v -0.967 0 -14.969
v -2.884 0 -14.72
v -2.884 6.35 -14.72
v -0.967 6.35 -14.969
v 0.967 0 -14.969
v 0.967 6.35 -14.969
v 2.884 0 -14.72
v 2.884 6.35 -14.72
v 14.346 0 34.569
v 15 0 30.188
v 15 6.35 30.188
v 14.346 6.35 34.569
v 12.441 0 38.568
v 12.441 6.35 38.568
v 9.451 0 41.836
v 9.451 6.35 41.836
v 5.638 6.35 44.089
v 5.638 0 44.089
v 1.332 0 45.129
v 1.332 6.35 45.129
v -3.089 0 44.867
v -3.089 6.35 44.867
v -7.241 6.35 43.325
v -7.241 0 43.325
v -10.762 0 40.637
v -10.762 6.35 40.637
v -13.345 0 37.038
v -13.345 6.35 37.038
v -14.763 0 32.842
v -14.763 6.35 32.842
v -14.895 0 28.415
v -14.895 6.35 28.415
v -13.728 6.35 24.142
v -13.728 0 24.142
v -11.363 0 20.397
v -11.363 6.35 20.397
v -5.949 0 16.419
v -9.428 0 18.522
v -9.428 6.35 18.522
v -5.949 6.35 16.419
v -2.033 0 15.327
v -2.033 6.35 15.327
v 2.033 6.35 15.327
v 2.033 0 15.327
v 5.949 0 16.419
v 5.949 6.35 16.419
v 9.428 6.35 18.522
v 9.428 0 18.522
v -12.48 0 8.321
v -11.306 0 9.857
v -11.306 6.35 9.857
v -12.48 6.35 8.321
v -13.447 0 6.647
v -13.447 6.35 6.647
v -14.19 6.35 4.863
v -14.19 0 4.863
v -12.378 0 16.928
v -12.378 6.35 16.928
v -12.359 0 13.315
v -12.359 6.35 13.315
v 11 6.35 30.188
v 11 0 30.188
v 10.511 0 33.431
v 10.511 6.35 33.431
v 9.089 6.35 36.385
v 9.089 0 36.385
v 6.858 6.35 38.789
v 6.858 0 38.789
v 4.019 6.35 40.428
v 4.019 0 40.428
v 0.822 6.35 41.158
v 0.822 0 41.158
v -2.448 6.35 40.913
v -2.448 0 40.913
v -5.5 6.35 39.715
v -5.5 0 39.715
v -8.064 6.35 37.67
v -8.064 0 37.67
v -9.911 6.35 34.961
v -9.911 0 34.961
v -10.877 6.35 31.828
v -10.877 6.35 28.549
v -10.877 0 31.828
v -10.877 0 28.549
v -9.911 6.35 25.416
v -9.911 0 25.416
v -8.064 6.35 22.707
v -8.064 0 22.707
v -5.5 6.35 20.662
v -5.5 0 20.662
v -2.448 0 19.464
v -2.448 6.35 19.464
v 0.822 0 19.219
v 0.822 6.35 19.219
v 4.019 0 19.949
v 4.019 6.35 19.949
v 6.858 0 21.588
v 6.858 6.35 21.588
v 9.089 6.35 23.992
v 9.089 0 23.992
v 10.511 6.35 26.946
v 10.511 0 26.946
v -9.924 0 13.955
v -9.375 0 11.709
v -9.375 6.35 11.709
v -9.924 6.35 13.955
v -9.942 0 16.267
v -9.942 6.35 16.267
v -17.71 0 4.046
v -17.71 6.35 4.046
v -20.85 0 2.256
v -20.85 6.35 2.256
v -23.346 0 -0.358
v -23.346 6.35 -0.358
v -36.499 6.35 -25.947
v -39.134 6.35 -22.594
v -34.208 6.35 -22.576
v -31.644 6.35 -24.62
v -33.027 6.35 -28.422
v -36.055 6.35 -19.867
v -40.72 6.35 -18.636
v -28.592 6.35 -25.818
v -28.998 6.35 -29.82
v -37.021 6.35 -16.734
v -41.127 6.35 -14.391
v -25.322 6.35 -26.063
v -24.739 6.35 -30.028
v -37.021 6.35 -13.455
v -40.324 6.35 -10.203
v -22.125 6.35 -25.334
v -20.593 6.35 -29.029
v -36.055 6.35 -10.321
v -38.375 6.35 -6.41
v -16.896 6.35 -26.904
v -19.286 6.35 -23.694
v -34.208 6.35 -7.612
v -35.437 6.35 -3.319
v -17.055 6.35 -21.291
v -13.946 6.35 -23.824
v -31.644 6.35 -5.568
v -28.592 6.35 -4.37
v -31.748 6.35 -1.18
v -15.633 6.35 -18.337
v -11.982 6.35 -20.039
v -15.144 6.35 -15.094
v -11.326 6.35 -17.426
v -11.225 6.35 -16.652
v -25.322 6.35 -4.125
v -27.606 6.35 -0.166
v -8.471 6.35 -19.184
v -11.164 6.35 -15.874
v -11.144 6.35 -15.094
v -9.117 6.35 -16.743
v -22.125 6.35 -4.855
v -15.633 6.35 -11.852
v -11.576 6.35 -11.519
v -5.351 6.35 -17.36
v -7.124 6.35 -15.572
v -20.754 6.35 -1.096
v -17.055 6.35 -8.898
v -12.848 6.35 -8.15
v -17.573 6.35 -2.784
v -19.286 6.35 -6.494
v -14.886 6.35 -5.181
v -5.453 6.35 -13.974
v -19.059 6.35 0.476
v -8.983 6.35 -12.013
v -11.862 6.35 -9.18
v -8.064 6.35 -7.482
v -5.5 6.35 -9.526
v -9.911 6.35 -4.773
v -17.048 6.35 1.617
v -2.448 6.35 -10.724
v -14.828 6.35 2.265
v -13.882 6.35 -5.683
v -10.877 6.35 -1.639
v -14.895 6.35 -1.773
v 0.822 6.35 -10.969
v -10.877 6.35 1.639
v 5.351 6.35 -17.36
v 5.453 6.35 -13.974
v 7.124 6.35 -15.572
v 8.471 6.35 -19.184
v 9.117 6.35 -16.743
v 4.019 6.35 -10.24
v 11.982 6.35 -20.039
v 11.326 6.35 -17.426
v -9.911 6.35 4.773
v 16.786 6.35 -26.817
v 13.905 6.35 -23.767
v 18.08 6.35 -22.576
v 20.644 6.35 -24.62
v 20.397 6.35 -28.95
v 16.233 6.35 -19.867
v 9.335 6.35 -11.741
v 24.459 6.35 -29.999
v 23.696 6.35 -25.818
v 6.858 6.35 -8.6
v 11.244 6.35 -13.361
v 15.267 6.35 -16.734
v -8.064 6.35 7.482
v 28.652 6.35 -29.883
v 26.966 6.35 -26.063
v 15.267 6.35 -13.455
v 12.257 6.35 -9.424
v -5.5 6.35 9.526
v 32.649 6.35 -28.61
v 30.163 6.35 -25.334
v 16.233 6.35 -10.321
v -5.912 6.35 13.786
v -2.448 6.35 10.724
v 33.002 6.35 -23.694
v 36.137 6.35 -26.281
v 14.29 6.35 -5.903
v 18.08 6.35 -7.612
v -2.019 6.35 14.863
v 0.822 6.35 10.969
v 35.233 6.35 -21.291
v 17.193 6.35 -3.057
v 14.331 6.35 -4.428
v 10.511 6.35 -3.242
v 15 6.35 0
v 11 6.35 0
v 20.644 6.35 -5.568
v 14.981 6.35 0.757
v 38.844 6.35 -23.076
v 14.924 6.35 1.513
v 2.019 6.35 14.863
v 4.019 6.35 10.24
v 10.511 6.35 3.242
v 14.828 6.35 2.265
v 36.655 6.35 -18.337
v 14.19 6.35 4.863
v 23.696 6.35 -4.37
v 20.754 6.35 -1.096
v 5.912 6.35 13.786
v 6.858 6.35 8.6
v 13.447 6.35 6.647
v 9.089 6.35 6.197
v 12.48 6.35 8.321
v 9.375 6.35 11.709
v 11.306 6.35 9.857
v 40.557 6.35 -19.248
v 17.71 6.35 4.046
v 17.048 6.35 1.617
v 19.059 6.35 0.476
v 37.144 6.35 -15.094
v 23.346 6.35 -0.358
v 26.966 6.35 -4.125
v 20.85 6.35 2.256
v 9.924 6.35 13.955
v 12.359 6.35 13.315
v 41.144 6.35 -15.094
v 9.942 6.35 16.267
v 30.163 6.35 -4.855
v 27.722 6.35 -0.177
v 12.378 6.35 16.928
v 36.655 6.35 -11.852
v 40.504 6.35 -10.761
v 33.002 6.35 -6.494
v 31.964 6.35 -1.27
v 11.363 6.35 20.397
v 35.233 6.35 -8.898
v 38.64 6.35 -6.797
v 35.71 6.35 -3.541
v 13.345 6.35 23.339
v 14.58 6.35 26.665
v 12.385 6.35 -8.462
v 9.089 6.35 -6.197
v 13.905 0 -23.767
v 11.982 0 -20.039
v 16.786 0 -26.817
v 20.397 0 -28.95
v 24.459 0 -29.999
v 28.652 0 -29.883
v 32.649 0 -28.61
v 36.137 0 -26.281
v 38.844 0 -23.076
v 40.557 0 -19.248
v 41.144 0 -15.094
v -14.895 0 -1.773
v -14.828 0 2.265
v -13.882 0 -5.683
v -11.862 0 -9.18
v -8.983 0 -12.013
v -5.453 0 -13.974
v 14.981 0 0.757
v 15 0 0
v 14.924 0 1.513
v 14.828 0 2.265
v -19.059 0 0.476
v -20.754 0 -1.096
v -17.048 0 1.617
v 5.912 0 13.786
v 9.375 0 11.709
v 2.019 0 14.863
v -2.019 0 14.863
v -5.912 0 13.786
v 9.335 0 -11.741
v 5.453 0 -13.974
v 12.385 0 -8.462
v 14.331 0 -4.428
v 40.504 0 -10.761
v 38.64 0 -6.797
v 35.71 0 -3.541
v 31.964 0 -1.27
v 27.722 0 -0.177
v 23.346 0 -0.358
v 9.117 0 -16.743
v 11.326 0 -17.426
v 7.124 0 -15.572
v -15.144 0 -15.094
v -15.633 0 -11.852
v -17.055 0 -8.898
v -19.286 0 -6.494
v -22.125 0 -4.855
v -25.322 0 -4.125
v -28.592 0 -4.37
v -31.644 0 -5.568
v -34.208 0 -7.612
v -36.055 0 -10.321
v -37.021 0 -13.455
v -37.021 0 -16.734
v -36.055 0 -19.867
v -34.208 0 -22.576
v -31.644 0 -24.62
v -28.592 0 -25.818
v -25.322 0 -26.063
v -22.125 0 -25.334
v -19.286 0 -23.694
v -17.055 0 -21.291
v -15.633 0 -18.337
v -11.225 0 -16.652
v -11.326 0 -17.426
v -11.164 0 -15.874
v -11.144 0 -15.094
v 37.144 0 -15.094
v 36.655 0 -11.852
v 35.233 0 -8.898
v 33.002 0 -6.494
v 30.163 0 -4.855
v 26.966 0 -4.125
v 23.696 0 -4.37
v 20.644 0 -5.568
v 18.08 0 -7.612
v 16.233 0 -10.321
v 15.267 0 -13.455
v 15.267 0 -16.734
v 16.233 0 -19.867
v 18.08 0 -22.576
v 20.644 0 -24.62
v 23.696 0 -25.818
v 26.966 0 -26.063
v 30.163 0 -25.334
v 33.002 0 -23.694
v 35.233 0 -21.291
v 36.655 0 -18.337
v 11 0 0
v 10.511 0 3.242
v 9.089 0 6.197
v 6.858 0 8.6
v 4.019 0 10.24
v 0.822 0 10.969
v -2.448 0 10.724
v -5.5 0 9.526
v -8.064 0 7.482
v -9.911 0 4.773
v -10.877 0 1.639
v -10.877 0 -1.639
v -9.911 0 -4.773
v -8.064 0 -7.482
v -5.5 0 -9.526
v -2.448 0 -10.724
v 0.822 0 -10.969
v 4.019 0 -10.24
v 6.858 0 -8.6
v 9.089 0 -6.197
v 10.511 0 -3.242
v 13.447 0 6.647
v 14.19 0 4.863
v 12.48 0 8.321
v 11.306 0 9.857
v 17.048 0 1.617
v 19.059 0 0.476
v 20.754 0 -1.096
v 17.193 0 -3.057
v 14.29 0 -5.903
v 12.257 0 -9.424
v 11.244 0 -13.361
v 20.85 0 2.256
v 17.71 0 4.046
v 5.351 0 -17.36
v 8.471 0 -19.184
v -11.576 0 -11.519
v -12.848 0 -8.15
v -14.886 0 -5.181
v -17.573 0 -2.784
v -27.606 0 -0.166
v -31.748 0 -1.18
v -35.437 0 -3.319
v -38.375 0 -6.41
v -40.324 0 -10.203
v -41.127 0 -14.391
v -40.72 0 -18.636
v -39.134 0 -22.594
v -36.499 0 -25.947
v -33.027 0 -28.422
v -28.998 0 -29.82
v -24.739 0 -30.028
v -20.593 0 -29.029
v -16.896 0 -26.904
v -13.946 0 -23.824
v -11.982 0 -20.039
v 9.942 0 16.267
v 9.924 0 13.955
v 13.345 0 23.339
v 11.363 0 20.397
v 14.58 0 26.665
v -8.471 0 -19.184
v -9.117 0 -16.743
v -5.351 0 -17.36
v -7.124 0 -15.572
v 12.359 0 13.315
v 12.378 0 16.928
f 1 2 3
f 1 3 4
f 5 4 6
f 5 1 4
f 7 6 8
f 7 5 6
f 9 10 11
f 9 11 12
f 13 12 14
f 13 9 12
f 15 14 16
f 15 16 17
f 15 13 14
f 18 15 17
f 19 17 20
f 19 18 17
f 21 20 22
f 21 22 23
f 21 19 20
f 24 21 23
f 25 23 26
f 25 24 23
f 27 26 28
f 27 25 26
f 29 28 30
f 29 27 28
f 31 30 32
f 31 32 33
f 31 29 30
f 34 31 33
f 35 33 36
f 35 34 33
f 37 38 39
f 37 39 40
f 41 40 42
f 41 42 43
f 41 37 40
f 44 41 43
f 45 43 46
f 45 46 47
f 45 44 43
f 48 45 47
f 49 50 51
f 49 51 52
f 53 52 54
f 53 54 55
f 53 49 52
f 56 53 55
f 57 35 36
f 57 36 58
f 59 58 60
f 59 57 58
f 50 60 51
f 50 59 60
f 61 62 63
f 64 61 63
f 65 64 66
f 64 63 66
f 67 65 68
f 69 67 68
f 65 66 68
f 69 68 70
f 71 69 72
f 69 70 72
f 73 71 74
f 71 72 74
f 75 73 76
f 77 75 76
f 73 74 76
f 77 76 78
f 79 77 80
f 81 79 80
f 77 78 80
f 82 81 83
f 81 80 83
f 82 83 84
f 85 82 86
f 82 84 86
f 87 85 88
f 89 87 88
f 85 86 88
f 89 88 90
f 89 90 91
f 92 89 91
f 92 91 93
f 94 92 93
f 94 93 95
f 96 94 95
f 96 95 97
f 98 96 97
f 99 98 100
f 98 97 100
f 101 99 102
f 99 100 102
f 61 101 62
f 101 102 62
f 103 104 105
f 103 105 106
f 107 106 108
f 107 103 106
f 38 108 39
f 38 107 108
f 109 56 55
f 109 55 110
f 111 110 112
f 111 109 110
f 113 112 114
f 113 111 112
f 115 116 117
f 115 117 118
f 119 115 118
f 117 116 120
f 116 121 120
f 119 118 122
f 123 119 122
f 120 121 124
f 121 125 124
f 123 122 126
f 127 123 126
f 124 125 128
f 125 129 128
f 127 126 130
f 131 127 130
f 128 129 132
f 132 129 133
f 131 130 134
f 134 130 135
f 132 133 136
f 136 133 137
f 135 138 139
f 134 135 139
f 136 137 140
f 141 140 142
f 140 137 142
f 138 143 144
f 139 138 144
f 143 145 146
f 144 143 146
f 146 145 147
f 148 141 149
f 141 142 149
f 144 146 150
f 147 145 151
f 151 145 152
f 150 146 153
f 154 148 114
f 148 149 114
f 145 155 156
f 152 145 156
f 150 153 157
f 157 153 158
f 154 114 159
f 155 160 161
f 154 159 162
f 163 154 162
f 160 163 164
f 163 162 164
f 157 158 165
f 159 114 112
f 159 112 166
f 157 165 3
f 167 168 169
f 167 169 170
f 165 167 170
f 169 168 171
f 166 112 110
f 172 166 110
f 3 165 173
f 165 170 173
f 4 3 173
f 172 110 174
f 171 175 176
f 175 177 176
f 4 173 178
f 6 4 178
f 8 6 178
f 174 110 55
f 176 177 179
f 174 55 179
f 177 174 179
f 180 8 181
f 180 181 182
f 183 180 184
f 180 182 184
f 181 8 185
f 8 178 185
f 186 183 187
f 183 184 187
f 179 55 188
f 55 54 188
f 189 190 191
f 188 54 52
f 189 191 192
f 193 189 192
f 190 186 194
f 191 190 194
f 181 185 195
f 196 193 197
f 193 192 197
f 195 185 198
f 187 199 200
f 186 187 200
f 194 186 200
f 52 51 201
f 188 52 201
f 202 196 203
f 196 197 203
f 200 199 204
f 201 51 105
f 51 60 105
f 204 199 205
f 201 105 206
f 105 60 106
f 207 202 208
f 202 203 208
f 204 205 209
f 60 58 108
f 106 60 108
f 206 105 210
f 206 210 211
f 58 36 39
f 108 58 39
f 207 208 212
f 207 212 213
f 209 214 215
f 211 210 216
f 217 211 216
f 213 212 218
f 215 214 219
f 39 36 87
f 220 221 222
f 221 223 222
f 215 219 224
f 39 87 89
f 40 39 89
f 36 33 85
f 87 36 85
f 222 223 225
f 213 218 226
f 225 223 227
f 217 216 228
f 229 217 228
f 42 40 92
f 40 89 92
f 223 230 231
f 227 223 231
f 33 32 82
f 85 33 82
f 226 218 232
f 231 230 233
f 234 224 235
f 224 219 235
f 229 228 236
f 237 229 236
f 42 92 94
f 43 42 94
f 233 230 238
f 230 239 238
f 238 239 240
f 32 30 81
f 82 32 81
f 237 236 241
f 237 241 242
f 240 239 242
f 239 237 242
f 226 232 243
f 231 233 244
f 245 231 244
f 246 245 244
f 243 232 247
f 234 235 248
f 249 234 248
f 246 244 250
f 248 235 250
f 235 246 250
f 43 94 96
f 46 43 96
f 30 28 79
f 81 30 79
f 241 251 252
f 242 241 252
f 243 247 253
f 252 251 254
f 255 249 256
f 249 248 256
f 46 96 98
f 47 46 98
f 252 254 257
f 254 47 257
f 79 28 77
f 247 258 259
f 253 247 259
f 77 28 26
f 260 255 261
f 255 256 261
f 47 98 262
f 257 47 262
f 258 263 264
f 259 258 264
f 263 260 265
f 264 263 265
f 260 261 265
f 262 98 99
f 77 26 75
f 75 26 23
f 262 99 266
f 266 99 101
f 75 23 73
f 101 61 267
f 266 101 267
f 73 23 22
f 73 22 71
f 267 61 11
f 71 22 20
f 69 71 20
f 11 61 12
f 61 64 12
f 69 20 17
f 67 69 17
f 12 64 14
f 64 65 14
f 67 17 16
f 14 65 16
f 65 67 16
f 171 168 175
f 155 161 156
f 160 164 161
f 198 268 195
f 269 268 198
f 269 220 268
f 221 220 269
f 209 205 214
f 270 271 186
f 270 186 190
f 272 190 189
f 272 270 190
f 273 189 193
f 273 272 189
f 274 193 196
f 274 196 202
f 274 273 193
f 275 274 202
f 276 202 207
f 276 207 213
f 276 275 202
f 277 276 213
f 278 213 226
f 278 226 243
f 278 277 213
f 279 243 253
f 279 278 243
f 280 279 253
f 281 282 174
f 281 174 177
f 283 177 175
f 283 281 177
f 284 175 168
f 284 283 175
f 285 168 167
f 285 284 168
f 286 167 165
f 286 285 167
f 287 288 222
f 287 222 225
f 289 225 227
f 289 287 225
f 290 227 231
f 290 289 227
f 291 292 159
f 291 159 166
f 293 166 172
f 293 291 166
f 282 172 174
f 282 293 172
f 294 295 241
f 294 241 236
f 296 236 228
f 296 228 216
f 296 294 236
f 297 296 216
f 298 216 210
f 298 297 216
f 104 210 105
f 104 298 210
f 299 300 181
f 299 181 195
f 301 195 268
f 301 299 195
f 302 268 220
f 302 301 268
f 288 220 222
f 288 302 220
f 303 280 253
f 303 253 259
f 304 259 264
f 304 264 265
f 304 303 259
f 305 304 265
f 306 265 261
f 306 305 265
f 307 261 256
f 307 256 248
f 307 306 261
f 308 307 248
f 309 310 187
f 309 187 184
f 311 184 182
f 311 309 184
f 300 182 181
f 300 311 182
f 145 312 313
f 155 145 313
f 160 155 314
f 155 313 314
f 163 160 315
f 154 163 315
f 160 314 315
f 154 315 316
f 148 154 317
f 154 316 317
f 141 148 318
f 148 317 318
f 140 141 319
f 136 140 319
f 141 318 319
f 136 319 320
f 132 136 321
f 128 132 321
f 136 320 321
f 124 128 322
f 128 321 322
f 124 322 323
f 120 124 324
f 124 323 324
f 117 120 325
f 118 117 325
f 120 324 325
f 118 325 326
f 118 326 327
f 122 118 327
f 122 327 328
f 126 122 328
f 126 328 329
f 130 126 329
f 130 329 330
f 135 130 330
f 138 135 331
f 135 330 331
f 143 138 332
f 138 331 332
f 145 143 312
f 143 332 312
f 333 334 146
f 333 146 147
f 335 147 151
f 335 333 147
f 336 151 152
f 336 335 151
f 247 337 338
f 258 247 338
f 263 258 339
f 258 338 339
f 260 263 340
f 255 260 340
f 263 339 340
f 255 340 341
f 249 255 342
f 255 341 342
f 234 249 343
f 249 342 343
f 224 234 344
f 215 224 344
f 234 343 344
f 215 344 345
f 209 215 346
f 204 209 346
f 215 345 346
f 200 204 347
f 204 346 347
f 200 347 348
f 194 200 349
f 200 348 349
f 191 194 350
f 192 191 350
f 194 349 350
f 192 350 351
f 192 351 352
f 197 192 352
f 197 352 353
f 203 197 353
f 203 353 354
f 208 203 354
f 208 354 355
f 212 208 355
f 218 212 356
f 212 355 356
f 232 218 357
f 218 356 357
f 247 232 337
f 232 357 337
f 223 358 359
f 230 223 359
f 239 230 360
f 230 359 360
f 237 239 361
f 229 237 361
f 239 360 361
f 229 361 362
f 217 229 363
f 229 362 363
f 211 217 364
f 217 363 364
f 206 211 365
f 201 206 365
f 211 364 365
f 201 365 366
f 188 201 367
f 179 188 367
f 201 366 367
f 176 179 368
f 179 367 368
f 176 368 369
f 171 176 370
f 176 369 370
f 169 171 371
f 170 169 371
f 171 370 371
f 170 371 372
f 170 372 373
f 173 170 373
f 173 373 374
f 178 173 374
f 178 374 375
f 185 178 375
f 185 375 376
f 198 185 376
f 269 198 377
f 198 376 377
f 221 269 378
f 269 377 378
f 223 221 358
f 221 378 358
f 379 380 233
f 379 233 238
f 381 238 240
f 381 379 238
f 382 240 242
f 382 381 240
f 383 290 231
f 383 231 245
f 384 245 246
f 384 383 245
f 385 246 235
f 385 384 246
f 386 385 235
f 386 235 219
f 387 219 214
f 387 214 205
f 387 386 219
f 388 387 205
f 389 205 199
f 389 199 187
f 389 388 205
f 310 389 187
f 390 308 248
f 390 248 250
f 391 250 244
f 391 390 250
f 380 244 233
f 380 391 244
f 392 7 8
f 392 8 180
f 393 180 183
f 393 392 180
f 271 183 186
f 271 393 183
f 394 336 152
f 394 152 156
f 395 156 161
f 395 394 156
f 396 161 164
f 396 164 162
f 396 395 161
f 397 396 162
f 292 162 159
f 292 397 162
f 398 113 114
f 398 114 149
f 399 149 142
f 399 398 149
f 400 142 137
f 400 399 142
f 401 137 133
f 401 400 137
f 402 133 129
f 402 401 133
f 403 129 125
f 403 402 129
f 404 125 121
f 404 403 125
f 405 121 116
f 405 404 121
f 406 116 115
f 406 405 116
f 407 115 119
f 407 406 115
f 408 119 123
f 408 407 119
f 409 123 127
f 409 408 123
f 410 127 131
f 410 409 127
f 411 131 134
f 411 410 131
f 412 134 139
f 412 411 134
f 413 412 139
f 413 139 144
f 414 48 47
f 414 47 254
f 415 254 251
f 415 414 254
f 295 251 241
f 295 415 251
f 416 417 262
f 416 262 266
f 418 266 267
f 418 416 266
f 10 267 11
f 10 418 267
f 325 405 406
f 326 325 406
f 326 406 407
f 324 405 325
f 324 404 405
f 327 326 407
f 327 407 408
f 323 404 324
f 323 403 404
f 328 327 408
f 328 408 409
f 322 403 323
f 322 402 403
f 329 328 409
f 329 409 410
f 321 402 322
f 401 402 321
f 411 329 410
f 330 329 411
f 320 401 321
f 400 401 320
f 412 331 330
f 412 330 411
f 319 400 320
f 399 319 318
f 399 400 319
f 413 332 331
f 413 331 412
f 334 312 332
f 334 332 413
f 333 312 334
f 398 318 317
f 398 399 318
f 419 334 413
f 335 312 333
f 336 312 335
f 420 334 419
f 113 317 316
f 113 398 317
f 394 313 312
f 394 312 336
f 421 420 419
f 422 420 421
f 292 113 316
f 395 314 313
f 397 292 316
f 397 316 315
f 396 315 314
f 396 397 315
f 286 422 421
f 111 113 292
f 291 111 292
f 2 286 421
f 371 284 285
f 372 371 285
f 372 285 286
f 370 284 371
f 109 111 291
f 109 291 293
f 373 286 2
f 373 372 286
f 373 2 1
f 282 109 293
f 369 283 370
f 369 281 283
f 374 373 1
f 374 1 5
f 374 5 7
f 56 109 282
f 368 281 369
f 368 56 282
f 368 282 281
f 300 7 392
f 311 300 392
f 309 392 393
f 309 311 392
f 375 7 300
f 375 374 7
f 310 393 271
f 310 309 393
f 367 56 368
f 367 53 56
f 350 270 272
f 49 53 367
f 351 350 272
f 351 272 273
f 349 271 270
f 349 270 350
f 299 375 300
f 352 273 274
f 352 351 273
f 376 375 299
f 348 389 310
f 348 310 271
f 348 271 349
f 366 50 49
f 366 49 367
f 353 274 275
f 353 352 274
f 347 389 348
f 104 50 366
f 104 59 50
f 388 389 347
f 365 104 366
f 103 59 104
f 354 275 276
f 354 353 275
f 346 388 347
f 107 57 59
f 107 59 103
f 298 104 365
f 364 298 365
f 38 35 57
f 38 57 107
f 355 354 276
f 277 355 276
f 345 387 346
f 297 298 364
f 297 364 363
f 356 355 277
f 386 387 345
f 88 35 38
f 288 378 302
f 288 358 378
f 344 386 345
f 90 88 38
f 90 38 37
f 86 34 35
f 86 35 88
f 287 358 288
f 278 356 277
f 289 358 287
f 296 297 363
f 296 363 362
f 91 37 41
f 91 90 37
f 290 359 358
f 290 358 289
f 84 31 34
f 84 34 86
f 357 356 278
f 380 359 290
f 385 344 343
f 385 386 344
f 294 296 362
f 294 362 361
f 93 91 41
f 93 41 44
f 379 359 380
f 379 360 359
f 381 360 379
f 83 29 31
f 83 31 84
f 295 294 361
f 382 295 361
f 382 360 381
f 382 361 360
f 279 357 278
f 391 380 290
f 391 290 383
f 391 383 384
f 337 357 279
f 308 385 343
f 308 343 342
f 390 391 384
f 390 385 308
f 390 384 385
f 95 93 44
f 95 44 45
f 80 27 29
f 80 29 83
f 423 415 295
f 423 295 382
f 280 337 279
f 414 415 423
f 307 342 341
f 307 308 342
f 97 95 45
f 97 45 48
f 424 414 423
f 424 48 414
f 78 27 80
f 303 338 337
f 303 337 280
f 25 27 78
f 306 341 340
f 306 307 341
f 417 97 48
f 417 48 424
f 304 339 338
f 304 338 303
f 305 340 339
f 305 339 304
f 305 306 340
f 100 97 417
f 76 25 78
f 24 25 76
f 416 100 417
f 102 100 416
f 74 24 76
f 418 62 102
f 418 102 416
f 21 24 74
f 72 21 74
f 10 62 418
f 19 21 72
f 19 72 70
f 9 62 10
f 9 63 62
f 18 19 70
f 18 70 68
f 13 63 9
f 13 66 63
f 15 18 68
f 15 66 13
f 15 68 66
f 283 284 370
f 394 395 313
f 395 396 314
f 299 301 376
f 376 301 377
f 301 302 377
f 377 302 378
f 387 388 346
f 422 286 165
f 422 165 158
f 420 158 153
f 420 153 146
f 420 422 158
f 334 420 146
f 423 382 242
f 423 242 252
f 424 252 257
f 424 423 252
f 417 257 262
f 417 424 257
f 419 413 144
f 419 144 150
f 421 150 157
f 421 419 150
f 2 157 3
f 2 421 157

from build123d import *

# Parameters (mm, degrees)
F0_R     = 11
F1_DEPTH = 6.35


# Not quite as in the source:
# - a length typed as a fraction of an inch, garbled in the dataset ("3 / 203.2 mm" for 3/8 in), is restored


with BuildPart() as f1:
    # F0 (on Front) → F1 (new body)
    with BuildSketch(Plane.XZ):
        with BuildLine():
            ThreePointArc((5.4528368022, -13.9737815501), (12.3853250267, -8.4618983676), (15, 0))
            ThreePointArc((15, 0), (14.956955291, 1.1355564373), (14.8280682104, 2.2645955817))
            ThreePointArc((14.8280682104, 2.2645955817), (14.5670313108, 3.5779321946), (14.1899117897, 4.8627567696))
            ThreePointArc((14.1899117897, 4.8627567696), (12.9903810568, 7.5), (11.3062267898, 9.8574457025))
            ThreePointArc((11.3062267898, 9.8574457025), (10.382095829, 10.8264530756), (9.3752314082, 11.7091859684))
            ThreePointArc((9.3752314082, 11.7091859684), (0, 15), (-9.3752314082, 11.7091859684))
            ThreePointArc((-9.3752314082, 11.7091859684), (-10.382095829, 10.8264530756), (-11.3062267898, 9.8574457025))
            ThreePointArc((-11.3062267898, 9.8574457025), (-12.9903810568, 7.5), (-14.1899117897, 4.8627567696))
            ThreePointArc((-14.1899117897, 4.8627567696), (-14.5670313108, 3.5779321946), (-14.8280682104, 2.2645955817))
            ThreePointArc((-14.8280682104, 2.2645955817), (-12.9903810568, -7.5), (-5.4528368022, -13.9737815501))
            ThreePointArc((-5.4528368022, -13.9737815501), (-4.1849354819, -14.4043852702), (-2.883685, -14.7202024721))
            ThreePointArc((-2.883685, -14.7202024721), (0, -15), (2.883685, -14.7202024721))
            ThreePointArc((2.883685, -14.7202024721), (4.1849354819, -14.4043852702), (5.4528368022, -13.9737815501))
        make_face()
        Circle(F0_R, mode=Mode.SUBTRACT)
        with BuildLine():
            ThreePointArc((14.1899117897, 4.8627567696), (14.5670313108, 3.5779321946), (14.8280682104, 2.2645955817))
            ThreePointArc((14.8280682104, 2.2645955817), (18.0862095917, 1.1045798418), (20.7543499599, -1.0959084571))
            ThreePointArc((20.7543499599, -1.0959084571), (22.0334229862, -0.6684079546), (23.3457232771, -0.3575182103))
            ThreePointArc((23.3457232771, -0.3575182103), (19.3449005461, 3.2647619918), (14.1899117897, 4.8627567696))
        make_face()
        with BuildLine():
            ThreePointArc((11.326259544, -17.4258400757), (8.0865105924, -16.2154068855), (5.4528368022, -13.9737815501))
            ThreePointArc((5.4528368022, -13.9737815501), (4.1849354819, -14.4043852702), (2.883685, -14.7202024721))
            ThreePointArc((2.883685, -14.7202024722), (6.8450834508, -18.3855563025), (11.982481491, -20.0392303225))
            ThreePointArc((11.982481491, -20.0392303225), (11.5955697619, -18.7473000611), (11.326259544, -17.4258400757))
        make_face()
        with BuildLine():
            ThreePointArc((23.3457232771, -0.3575182103), (22.0334229862, -0.6684079546), (20.7543499599, -1.0959084571))
            ThreePointArc((20.7543499599, -1.0959084571), (13.153553406, -7.5942075998), (11.326259544, -17.4258400757))
            ThreePointArc((11.326259544, -17.4258400757), (11.5955697619, -18.7473000611), (11.982481491, -20.0392303225))
            ThreePointArc((11.982481491, -20.0392303225), (28.6517428111, -29.8830850855), (41.1439344628, -15.0942075998))
            ThreePointArc((41.1439344628, -15.0942075998), (35.7101989431, -3.5405681778), (23.3457232771, -0.3575182103))
        make_face()
        with Locations((26.1439344628, -15.0942075998)):
            Circle(F0_R, mode=Mode.SUBTRACT)
        with BuildLine():
            ThreePointArc((9.3752314082, 11.7091859684), (10.382095829, 10.8264530756), (11.3062267898, 9.8574457025))
            ThreePointArc((11.3062267898, 9.8574457025), (12.4998170953, 15.1207943107), (11.3632417861, 20.3967485329))
            ThreePointArc((11.3632417861, 20.3967485329), (10.4378532243, 19.4157080157), (9.4280904158, 18.5217485329))
            ThreePointArc((9.4280904158, 18.5217485329), (9.9996989994, 15.1108270437), (9.3752314082, 11.7091859684))
        make_face()
        with BuildLine():
            ThreePointArc((-11.982481491, -20.0392303225), (-6.8450834508, -18.3855563025), (-2.883685, -14.7202024722))
            ThreePointArc((-2.883685, -14.7202024721), (-4.1849354819, -14.4043852702), (-5.4528368022, -13.9737815501))
            ThreePointArc((-5.4528368022, -13.9737815501), (-8.0865105924, -16.2154068855), (-11.326259544, -17.4258400757))
            ThreePointArc((-11.326259544, -17.4258400757), (-11.5955697619, -18.7473000611), (-11.982481491, -20.0392303225))
        make_face()
        with BuildLine():
            ThreePointArc((9.4280904158, 18.5217485329), (10.4378532243, 19.4157080157), (11.3632417861, 20.3967485329))
            ThreePointArc((11.3632417861, 20.3967485329), (14.0614477703, 24.9658021941), (15, 30.1884151995))
            ThreePointArc((15, 30.1884151995), (-5.2226130054, 44.2498629698), (-11.3632417861, 20.3967485329))
            ThreePointArc((-11.3632417861, 20.3967485329), (-10.4378532243, 19.4157080157), (-9.4280904158, 18.5217485329))
            ThreePointArc((-9.4280904158, 18.5217485329), (0, 15.1884151995), (9.4280904158, 18.5217485329))
        make_face()
        with Locations((0, 30.1884151995)):
            Circle(F0_R, mode=Mode.SUBTRACT)
        with BuildLine():
            ThreePointArc((-23.3457232771, -0.3575182103), (-39.1343155195, -22.5942075998), (-11.982481491, -20.0392303225))
            ThreePointArc((-11.982481491, -20.0392303225), (-11.5955697619, -18.7473000611), (-11.326259544, -17.4258400757))
            ThreePointArc((-11.326259544, -17.4258400757), (-11.1895851994, -16.2635826934), (-11.1439344628, -15.0942075998))
            ThreePointArc((-11.1439344628, -15.0942075998), (-13.7777756504, -6.6043244305), (-20.7543499599, -1.0959084571))
            ThreePointArc((-20.7543499599, -1.0959084571), (-22.0334229862, -0.6684079546), (-23.3457232771, -0.3575182103))
        make_face()
        with Locations((-26.1439344628, -15.0942075998)):
            Circle(F0_R, mode=Mode.SUBTRACT)
        with BuildLine():
            ThreePointArc((-11.3062267898, 9.8574457025), (-10.382095829, 10.8264530756), (-9.3752314082, 11.7091859684))
            ThreePointArc((-9.3752314082, 11.7091859684), (-9.9996989994, 15.1108270437), (-9.4280904158, 18.5217485329))
            ThreePointArc((-9.4280904158, 18.5217485329), (-10.4378532243, 19.4157080157), (-11.3632417861, 20.3967485329))
            ThreePointArc((-11.3632417861, 20.3967485329), (-12.4998170953, 15.1207943107), (-11.3062267898, 9.8574457025))
        make_face()
        with BuildLine():
            ThreePointArc((-20.7543499599, -1.0959084571), (-18.0862095917, 1.1045798418), (-14.8280682104, 2.2645955817))
            ThreePointArc((-14.8280682104, 2.2645955817), (-14.5670313108, 3.5779321946), (-14.1899117897, 4.8627567696))
            ThreePointArc((-14.1899117897, 4.8627567696), (-19.3449005461, 3.2647619918), (-23.3457232771, -0.3575182103))
            ThreePointArc((-23.3457232771, -0.3575182103), (-22.0334229862, -0.6684079546), (-20.7543499599, -1.0959084571))
        make_face()
    extrude(amount=-F1_DEPTH)


solid = f1.part
